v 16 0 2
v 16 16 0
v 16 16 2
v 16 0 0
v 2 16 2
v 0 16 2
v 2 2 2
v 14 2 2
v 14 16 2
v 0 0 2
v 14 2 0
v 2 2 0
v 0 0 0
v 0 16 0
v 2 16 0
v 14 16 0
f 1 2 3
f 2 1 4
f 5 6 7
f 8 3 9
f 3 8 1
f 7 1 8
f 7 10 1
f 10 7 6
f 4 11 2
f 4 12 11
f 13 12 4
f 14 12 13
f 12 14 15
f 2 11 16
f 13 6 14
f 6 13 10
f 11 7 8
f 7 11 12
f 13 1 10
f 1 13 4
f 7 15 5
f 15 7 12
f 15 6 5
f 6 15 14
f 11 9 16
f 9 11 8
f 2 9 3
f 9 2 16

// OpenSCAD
union() {
  translate([0, 0, 0]) cube(size=[16,2,2], center=false);

  translate([0, 0, 0]) cube(size=[2,16,2], center=false);

  translate([14, 0, 0]) cube(size=[2,16,2], center=false);
}
